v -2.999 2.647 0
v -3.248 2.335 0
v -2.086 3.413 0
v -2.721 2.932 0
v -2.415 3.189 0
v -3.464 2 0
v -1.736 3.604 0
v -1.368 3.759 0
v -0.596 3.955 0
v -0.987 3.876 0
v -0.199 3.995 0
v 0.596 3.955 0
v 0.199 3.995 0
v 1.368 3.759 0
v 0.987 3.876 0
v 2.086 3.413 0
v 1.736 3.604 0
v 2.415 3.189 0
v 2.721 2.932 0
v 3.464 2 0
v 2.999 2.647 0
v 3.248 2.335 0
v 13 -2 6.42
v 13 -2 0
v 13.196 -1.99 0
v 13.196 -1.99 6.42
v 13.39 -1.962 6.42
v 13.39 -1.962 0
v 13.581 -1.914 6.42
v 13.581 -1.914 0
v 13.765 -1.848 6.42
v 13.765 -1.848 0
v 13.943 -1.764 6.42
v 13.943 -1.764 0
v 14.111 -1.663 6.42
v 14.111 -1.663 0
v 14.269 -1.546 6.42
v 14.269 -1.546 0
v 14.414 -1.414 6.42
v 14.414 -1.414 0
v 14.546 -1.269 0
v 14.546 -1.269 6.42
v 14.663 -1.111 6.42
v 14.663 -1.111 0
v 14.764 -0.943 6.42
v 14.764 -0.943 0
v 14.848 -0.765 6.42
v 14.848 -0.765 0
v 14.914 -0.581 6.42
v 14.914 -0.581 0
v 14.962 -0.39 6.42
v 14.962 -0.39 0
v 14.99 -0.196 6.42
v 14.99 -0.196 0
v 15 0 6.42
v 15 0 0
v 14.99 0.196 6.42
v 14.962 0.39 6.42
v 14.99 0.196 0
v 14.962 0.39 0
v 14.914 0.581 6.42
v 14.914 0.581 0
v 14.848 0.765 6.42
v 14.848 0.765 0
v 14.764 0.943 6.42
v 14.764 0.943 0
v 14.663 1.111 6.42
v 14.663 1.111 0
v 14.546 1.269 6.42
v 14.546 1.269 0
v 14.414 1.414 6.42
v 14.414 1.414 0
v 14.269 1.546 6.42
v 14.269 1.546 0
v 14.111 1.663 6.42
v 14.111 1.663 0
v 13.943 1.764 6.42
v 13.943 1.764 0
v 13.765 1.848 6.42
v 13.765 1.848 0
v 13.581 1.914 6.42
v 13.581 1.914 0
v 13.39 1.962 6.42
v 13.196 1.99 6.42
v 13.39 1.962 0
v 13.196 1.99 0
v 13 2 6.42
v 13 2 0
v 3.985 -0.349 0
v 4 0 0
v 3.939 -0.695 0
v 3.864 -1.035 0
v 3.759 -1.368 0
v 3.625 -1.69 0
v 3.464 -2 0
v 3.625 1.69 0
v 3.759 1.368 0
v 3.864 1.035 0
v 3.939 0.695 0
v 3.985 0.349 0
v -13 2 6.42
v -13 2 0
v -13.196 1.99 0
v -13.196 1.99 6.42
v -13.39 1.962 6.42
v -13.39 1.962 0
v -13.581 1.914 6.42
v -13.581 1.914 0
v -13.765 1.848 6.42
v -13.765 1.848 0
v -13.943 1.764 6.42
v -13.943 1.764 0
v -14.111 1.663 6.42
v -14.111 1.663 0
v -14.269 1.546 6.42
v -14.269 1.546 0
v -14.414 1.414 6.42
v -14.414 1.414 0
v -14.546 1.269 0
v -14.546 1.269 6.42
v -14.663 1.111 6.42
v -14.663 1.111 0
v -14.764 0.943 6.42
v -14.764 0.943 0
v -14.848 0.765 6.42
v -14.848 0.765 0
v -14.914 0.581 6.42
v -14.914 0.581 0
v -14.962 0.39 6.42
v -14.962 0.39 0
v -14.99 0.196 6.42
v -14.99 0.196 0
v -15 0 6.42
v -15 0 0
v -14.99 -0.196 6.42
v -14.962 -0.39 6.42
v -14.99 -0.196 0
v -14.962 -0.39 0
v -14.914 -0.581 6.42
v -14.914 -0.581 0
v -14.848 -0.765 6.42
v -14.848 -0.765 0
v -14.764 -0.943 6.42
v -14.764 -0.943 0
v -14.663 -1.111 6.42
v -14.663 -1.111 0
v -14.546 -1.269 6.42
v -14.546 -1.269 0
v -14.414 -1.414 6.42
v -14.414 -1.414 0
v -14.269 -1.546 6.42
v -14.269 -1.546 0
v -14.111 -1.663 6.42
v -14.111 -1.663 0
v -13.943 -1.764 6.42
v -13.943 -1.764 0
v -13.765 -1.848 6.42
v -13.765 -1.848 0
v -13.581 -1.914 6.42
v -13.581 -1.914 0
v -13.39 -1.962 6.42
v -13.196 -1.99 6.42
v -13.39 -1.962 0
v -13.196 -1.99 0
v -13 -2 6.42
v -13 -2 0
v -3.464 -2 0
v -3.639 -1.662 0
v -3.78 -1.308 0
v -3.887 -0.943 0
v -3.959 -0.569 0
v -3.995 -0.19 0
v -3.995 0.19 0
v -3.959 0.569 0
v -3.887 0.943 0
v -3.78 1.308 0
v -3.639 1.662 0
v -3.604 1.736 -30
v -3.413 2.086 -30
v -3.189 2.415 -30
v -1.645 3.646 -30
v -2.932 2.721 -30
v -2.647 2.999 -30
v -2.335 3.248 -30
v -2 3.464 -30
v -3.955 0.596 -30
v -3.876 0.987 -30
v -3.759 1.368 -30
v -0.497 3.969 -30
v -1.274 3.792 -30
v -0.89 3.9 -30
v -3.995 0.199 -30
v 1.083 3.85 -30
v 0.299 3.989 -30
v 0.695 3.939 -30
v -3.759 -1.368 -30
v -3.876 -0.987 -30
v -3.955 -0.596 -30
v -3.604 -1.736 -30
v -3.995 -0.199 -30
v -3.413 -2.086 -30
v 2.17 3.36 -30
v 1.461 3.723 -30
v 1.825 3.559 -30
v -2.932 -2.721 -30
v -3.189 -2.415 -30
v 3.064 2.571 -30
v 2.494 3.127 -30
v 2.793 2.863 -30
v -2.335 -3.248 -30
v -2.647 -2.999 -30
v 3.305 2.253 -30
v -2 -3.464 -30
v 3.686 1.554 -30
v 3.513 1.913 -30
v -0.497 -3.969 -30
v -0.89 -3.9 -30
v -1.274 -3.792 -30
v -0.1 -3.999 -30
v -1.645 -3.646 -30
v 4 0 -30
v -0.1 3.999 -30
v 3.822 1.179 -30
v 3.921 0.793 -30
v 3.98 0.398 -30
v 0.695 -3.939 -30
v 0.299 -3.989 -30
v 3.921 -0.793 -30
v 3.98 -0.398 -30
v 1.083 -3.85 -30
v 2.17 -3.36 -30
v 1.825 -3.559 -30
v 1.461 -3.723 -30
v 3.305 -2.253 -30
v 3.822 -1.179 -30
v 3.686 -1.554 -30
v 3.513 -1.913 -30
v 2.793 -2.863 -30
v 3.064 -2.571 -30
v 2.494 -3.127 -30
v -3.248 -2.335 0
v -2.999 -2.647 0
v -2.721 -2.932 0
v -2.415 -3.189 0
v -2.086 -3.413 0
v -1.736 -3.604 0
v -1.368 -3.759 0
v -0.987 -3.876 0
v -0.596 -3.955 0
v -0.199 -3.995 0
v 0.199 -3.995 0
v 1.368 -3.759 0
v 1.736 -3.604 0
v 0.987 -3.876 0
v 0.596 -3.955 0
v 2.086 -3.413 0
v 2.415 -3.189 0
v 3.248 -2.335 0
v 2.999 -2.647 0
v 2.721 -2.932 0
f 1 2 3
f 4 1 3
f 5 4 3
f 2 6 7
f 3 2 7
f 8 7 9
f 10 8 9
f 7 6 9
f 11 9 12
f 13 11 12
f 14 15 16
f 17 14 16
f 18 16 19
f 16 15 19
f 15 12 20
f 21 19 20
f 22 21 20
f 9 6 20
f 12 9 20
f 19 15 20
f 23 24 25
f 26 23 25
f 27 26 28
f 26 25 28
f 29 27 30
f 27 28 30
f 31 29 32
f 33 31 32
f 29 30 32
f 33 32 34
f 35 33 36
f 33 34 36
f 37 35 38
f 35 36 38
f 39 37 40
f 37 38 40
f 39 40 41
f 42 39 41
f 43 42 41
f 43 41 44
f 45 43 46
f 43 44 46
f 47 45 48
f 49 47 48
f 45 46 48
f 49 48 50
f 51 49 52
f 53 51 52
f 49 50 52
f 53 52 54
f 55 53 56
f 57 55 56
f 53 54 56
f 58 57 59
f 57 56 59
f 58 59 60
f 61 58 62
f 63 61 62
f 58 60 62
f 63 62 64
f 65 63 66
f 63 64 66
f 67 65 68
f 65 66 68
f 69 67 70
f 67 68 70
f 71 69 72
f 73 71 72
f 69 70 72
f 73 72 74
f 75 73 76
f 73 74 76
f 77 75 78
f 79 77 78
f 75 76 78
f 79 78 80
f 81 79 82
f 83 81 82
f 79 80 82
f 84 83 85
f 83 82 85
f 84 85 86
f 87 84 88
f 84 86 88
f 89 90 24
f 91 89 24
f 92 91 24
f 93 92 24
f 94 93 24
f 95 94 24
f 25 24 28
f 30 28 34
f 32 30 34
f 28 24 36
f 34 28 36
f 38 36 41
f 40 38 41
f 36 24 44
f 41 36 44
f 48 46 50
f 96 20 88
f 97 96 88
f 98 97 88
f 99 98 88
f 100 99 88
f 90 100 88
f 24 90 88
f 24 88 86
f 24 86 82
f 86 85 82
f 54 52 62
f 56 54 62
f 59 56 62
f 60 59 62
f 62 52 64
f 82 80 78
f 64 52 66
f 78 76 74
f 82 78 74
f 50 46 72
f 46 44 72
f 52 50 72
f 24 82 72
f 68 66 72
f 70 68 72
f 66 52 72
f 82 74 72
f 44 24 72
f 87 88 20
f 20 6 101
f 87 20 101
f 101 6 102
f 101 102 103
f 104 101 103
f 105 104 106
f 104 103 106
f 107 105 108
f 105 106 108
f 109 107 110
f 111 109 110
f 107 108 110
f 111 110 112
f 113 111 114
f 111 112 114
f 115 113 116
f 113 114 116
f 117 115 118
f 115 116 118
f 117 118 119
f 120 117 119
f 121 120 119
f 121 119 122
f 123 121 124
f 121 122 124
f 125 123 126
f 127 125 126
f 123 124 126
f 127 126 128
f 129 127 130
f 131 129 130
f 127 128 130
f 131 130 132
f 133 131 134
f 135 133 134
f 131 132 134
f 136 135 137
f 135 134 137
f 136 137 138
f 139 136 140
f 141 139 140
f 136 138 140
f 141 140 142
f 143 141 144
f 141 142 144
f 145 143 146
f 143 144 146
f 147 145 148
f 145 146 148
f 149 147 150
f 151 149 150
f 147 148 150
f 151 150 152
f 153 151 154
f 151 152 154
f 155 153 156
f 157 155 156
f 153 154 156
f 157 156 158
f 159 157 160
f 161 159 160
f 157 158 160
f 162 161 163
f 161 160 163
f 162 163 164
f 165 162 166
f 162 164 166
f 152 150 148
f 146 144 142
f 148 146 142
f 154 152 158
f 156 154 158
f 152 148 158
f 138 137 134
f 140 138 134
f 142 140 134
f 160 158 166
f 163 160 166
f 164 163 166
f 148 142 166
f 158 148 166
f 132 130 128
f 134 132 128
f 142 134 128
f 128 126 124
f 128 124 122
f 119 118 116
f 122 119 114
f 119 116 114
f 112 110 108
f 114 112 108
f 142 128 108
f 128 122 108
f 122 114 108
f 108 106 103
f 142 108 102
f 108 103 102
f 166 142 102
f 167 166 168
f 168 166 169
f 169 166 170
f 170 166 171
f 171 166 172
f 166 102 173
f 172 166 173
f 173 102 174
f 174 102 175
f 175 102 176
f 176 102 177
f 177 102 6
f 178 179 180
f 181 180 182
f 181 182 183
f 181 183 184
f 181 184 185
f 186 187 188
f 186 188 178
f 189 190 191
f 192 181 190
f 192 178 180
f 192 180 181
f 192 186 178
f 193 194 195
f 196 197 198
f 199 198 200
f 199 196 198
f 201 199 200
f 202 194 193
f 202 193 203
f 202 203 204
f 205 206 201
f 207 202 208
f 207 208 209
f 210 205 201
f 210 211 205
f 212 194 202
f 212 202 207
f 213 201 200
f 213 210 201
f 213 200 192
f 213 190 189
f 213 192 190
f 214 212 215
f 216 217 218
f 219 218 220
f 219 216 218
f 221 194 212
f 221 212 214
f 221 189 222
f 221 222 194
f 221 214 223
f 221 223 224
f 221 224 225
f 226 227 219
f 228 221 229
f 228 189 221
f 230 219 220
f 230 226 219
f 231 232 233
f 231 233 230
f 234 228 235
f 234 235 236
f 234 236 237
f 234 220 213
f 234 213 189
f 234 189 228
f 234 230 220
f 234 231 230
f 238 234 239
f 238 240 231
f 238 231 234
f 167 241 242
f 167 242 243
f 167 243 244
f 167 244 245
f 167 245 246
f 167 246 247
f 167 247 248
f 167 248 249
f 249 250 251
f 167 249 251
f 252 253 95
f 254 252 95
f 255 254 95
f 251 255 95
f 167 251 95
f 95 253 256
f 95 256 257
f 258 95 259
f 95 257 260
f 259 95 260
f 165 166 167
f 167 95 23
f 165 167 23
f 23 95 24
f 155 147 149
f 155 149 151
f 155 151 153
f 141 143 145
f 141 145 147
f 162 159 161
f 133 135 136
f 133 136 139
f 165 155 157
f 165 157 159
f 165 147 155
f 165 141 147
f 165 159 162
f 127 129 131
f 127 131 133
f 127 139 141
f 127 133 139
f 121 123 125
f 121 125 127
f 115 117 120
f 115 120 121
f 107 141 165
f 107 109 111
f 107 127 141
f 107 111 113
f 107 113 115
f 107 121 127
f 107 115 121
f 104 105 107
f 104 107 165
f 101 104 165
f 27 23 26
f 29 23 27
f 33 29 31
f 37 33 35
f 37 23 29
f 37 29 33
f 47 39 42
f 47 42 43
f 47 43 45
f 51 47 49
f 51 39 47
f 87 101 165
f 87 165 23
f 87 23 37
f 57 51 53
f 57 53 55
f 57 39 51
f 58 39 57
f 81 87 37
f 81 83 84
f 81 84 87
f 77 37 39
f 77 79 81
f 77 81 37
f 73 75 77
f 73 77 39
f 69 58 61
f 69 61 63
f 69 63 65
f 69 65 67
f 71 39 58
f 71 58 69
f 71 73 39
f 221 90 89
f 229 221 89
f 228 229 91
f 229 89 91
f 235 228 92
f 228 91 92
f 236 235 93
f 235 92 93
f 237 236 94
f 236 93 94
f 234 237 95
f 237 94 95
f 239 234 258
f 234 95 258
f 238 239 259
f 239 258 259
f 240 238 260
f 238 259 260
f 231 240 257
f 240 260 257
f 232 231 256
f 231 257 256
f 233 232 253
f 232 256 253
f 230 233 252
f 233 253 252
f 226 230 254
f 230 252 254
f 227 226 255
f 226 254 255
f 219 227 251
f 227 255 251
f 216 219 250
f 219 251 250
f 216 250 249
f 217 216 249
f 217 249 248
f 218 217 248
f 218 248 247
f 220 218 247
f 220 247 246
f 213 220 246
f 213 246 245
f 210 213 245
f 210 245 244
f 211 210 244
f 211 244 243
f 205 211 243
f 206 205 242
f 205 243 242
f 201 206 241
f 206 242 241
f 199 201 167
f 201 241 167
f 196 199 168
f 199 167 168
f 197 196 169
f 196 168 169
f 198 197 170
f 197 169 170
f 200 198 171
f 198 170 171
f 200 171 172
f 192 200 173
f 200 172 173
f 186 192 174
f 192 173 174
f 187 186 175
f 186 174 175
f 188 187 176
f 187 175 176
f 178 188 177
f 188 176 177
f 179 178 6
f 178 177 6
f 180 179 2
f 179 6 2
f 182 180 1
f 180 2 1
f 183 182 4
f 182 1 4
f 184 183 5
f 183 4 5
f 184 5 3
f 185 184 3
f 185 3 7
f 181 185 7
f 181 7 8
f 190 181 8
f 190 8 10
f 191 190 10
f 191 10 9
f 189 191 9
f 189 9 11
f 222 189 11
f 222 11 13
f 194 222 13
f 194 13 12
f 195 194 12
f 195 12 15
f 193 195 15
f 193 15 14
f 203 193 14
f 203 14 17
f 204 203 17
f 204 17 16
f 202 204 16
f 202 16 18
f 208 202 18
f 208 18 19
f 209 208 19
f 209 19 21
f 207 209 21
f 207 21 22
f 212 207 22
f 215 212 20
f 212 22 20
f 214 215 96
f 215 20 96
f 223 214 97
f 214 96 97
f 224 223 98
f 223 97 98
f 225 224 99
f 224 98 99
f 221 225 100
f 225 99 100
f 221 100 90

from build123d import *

# Parameters (mm, degrees)
F1_DEPTH = 6.42
F2_R     = 4
F3_DEPTH = 30


with BuildPart() as f1:
    # F0 (on Top) → F1 (new body)
    with BuildSketch(Plane.XY):
        with BuildLine():
            Line((13, 2), (-13, 2))
            ThreePointArc((-13, 2), (-15, 0), (-13, -2))
            Line((-13, -2), (13, -2))
            ThreePointArc((13, -2), (15, 0), (13, 2))
        make_face()
    extrude(amount=F1_DEPTH)

    # F2 (on face) → F3 (join)
    with BuildSketch(Plane(origin=(0, 0, 0), x_dir=(1, 0, 0), z_dir=(0, 0, -1))):
        Circle(F2_R)
    extrude(amount=F3_DEPTH)


solid = f1.part
